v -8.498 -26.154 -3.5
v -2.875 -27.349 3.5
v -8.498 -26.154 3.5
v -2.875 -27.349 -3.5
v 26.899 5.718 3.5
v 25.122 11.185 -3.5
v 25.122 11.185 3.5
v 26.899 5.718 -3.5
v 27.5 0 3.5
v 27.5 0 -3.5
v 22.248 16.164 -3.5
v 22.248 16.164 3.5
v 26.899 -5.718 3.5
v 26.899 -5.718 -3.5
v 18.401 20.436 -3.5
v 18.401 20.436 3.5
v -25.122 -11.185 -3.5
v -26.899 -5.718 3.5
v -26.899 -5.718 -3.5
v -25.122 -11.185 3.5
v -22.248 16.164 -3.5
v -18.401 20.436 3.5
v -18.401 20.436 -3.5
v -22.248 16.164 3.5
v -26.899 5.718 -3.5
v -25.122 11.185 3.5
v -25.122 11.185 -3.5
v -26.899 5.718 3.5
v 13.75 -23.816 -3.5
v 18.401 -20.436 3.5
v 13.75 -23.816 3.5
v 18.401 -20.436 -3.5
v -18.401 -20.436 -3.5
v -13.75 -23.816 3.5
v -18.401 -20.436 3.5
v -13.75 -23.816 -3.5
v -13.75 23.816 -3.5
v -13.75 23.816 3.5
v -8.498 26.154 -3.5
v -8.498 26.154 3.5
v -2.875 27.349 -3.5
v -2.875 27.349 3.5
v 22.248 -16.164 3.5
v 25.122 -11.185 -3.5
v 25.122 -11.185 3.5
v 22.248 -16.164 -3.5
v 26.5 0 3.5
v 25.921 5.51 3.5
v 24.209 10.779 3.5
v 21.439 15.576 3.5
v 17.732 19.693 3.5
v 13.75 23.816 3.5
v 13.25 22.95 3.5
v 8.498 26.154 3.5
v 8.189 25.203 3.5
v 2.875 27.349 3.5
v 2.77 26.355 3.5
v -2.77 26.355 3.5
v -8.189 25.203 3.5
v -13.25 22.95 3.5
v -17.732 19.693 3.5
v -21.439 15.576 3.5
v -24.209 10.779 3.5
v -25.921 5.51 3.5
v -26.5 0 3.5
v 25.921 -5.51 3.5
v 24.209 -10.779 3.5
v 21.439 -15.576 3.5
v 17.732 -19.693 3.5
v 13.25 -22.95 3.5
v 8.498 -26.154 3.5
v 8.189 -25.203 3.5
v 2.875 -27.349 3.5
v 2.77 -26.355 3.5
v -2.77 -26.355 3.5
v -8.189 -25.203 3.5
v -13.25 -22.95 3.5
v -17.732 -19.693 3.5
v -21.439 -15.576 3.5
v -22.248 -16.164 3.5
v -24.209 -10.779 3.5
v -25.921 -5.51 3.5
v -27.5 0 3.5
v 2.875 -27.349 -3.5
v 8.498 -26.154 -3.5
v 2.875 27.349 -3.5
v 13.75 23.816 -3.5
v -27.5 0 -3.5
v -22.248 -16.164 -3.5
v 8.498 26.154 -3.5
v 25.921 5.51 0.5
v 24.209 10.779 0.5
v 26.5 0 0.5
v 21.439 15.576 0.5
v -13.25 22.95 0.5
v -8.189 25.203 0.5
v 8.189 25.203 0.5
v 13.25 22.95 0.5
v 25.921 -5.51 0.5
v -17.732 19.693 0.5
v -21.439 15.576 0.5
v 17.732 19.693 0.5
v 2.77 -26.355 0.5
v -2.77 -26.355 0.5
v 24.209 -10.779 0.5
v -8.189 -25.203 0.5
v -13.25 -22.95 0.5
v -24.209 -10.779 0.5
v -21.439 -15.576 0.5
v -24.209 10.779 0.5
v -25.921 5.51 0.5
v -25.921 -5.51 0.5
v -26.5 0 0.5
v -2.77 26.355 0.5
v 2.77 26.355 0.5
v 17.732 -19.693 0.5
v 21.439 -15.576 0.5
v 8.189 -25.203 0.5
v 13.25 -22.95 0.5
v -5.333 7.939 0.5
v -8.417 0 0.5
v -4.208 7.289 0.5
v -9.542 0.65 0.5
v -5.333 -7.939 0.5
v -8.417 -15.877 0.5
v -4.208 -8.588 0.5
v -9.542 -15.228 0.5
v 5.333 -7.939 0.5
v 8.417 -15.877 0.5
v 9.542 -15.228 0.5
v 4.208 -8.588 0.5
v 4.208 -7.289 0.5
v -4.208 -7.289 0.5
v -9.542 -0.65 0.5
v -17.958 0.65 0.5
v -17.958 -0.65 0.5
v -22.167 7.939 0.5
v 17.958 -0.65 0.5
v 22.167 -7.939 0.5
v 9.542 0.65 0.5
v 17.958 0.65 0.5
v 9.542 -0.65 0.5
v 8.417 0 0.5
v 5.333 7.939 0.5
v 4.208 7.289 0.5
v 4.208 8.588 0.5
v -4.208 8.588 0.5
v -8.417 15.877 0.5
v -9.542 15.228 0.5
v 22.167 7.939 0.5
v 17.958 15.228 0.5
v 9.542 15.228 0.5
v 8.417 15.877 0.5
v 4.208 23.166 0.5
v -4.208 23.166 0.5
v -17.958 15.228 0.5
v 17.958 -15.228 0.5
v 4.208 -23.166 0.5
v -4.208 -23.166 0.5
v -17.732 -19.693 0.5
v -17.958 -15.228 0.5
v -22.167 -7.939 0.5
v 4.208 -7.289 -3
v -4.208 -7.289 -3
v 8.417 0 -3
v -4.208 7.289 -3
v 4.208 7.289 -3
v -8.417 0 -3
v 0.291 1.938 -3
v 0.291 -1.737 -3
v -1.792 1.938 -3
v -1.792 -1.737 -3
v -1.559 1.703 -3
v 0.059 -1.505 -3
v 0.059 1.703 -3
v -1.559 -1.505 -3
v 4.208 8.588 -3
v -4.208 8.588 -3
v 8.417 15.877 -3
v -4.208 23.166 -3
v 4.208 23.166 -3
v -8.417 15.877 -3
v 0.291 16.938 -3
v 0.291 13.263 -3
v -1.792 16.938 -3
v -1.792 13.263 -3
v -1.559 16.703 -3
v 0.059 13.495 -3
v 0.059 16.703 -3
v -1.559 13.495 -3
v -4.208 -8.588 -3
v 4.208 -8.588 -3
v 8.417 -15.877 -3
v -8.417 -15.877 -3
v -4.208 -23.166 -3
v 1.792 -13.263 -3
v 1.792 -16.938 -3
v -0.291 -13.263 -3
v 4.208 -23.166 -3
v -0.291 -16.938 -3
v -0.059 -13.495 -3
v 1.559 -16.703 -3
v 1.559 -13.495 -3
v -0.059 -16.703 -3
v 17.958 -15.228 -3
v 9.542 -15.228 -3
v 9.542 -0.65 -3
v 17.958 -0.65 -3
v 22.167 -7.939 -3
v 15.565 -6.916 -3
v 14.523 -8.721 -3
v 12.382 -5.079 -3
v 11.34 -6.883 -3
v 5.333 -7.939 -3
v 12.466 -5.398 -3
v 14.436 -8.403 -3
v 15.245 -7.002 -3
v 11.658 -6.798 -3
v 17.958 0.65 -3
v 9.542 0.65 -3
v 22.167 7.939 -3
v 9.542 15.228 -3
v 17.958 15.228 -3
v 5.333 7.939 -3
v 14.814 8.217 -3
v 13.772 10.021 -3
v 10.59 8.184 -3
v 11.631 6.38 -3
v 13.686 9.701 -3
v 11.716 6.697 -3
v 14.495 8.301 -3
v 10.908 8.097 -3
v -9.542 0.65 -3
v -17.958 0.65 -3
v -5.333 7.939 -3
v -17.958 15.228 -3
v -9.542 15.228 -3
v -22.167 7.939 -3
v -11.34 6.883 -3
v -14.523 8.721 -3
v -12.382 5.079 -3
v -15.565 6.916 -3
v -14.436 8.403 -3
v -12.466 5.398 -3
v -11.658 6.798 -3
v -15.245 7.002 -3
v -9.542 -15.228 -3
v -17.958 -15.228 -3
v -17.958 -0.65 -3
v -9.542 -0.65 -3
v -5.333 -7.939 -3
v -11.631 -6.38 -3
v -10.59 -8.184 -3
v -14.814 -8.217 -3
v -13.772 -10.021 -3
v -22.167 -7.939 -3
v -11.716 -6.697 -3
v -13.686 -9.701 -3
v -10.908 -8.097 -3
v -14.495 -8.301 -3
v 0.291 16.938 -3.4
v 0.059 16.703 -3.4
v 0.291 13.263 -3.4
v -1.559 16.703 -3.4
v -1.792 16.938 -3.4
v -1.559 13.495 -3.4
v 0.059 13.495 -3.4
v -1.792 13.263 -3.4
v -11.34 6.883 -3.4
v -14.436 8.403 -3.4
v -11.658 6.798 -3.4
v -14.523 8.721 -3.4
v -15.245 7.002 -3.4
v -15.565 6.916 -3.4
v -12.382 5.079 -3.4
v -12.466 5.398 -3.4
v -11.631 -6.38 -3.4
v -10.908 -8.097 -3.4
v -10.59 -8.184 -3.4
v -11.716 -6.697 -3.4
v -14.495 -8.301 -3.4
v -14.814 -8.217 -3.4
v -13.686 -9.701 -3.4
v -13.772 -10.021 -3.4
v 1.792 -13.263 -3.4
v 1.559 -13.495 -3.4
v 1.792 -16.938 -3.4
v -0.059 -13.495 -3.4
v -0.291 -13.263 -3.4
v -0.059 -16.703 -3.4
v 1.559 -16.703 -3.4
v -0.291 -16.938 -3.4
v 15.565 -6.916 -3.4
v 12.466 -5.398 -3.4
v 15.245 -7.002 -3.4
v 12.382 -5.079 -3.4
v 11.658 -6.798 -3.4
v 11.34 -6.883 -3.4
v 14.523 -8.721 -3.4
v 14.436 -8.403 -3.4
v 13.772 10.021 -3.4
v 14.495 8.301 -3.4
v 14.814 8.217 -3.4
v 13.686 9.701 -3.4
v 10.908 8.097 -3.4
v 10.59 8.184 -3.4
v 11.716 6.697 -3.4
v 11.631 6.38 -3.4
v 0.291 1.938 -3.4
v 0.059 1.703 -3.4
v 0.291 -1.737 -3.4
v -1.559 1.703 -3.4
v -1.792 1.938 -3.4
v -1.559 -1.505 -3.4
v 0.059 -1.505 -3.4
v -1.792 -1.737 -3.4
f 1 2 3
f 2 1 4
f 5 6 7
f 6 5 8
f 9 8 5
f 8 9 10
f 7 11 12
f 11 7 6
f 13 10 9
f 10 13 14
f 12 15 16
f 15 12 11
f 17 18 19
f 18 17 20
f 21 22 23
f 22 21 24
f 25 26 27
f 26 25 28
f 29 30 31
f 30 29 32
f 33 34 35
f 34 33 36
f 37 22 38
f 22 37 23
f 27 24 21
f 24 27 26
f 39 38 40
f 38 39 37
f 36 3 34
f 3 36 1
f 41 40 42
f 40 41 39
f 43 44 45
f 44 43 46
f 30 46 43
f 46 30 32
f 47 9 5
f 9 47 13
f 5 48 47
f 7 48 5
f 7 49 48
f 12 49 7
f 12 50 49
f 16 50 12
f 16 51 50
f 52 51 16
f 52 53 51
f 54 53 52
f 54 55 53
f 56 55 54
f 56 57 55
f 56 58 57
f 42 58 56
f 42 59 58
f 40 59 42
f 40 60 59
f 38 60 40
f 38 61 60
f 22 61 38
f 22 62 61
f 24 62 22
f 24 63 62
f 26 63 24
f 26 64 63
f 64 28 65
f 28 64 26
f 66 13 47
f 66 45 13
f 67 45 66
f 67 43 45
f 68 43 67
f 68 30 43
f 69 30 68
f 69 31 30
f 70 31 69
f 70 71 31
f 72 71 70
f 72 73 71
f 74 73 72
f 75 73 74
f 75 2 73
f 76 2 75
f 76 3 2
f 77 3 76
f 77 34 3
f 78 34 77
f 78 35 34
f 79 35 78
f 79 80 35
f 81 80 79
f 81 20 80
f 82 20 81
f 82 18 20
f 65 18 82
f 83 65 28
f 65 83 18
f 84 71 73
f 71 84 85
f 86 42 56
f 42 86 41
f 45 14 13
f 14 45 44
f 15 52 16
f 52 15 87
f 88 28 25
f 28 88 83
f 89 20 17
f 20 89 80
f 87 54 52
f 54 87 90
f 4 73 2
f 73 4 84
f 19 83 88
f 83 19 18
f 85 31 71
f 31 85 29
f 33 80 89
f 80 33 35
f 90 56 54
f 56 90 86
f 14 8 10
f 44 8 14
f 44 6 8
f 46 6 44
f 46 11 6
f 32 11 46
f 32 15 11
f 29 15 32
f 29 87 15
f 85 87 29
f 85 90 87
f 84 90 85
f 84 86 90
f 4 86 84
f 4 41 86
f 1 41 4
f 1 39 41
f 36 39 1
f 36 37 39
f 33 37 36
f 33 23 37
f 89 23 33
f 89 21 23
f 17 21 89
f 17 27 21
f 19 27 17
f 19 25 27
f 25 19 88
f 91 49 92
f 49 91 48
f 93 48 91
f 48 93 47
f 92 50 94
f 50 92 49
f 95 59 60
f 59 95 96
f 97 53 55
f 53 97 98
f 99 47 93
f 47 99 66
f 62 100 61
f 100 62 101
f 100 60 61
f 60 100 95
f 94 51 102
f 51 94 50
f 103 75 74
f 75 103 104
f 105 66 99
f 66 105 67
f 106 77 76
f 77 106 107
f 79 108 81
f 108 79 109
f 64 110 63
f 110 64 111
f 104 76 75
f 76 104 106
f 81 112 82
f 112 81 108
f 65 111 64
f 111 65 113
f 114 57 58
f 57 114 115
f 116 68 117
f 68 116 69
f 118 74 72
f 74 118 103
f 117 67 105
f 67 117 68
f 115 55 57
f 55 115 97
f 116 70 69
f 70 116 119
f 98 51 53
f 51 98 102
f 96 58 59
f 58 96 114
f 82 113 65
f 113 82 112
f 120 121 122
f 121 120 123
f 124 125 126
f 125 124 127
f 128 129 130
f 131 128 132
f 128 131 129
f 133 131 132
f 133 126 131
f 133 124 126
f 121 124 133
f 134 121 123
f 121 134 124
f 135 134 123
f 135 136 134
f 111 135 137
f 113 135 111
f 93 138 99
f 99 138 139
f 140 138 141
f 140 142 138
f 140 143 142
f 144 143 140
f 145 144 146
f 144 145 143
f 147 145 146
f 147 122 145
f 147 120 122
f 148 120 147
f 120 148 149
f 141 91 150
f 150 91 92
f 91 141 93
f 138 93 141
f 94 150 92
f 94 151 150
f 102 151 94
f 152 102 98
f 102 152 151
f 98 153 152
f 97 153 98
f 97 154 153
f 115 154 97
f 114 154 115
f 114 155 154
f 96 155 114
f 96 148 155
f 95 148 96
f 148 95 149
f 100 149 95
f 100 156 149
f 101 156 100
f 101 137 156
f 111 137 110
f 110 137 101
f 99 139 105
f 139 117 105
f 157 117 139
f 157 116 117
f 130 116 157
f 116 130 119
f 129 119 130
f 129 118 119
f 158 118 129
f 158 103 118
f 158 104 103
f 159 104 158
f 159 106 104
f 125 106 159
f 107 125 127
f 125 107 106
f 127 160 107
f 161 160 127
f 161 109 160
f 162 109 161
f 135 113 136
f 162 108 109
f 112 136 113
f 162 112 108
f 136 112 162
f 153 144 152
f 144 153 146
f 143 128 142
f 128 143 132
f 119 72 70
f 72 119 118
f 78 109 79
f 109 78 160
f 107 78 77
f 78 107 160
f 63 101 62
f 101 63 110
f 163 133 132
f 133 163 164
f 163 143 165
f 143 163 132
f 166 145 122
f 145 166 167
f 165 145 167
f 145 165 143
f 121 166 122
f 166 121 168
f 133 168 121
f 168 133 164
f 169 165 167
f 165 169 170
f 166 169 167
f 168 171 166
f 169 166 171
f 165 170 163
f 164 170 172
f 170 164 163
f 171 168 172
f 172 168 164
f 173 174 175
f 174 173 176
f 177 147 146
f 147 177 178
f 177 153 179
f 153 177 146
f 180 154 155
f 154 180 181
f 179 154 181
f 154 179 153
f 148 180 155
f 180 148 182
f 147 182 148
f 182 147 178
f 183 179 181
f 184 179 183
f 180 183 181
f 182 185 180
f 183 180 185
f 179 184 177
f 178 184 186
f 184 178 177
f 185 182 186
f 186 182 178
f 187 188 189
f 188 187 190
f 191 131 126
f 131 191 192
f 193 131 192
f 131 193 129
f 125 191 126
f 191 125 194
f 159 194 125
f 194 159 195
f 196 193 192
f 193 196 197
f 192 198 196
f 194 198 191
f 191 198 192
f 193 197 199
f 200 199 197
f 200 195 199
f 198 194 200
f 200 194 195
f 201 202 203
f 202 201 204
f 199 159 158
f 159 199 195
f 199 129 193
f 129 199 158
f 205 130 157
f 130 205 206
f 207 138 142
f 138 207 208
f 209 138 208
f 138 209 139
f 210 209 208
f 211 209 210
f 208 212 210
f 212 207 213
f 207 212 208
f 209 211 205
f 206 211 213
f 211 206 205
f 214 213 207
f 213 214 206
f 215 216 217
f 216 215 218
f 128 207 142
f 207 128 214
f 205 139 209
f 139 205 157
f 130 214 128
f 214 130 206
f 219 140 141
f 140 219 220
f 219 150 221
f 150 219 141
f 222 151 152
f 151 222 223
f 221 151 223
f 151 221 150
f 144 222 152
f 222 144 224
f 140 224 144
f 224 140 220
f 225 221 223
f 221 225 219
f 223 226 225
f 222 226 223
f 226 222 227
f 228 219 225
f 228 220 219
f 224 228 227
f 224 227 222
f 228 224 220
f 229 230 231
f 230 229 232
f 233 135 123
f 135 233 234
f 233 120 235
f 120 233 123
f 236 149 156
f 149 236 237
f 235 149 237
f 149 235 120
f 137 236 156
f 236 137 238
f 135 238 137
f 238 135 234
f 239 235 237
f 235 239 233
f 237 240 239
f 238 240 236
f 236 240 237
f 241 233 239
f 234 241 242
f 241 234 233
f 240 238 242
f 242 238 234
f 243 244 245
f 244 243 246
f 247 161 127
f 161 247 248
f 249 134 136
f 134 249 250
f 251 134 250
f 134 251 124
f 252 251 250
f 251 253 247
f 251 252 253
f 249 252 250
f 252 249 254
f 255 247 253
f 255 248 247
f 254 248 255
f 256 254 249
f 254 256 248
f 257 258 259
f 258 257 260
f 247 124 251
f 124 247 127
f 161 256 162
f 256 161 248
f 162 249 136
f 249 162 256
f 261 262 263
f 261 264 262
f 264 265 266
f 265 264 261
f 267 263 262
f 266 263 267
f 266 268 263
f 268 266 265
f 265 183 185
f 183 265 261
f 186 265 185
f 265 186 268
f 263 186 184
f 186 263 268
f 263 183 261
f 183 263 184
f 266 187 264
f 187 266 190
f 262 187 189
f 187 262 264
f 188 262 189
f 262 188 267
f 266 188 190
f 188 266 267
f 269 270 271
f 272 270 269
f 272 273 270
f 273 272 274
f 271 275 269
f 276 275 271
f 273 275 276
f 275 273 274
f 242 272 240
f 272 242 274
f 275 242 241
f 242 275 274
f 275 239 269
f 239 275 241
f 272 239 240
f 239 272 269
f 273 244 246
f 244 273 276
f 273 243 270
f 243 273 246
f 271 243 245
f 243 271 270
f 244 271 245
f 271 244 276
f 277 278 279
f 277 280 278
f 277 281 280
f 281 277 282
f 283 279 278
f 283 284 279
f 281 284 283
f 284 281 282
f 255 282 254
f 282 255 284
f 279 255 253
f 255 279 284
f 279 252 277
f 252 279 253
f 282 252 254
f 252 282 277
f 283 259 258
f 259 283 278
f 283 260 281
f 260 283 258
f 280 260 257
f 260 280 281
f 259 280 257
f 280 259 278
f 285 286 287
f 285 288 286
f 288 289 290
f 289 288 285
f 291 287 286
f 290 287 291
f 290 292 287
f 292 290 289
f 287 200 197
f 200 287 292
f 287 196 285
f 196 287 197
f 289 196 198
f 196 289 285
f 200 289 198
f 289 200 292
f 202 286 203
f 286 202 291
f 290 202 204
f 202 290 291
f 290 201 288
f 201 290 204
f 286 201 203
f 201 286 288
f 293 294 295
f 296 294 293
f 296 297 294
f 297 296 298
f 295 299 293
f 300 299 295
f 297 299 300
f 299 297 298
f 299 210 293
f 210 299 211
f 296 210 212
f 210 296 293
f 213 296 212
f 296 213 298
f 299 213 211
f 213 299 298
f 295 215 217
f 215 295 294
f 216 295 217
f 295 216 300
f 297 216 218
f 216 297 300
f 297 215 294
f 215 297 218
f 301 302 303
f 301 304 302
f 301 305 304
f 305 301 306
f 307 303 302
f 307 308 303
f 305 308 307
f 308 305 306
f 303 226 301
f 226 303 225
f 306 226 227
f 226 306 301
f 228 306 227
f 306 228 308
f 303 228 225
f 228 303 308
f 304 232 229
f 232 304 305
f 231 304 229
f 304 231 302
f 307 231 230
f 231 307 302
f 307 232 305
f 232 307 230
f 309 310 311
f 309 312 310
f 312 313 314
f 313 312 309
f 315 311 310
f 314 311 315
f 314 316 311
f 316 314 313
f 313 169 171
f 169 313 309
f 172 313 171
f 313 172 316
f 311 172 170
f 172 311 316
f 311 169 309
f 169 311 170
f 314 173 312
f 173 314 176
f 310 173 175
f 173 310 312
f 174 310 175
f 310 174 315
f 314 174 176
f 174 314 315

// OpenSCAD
/* use <../NotoSansJP-DemiLight.otf> */


dr = 55/2;
dh = 7;
dw = 1;
df = 8;


hr = dr/3;
hw = .75;
hh = (df-2);
hd = hr * sqrt(3);



module labels() {
   translate([0, 0, -2.4]) {
      rotate([0, 0, 0]) {translate([-2,14, 0]) {number(1);}}
      rotate([0, 0, 60]) {translate([-2, 14, 0]) {number(2);}}
      rotate([0, 0, 120]) {translate([-2, 14, 0]) {number(3);}}
      rotate([0, 0, 180]) {translate([-2, 14, 0]) {number(4);}}
      rotate([0, 0, 240]) {translate([-2, 14, 0]) {number(5);}}
      rotate([0, 0, 300]) {translate([-2, 14, 0]) {number(6);}}
      rotate([0, 0, 0]) {translate([-2,-1, 0]) {number(7);}}
   }
}

/* lid(); */

difference() {
   lid();
   union() {
      hexhex();
      labels();
   }
}


module lid() {
   difference() {
      cylinder(r=dr, h=dh, center=true);
      translate([0, 0, df]) {cylinder(r=dr-dw, h=dh+df, center=true);}
   }
}


module hexhex() {
   hexagon(hr,hh);
   translate([0, hd, 0]) {hexagon(hr, hh);}
   translate([0, -hd, 0]) {hexagon(hr, hh);}
   translate([hr*1.5, -hd/2, 0]) {hexagon(hr, hh);}
   translate([hr*1.5, hd/2, 0]) {hexagon(hr, hh);}
   translate([-hr*1.5, hd/2, 0]) {hexagon(hr, hh);}
   translate([-hr*1.5, -hd/2, 0]) {hexagon(hr, hh);}

}
module hexagon(hex_radius,hex_height) {
   cylinder(r=hex_radius-hw, h=hex_height, $fn=6, center = true);
}


module number(n) {
   translate([0,0,0]) {
      scale([.3,.3,1]) {
         linear_extrude(height = 2, center = true, convexity = 10, twist = 0)
         if (n==1) { text("一", font = "NotoSansJP-DemiLight");}
         else if (n==2) { text("二", font = "NotoSansJP-DemiLight");}
         else if (n==3) { text("三", font = "NotoSansJP-DemiLight");}
         else if (n==4) { text("四", font = "NotoSansJP-DemiLight");}
         else if (n==5) { text("五", font = "NotoSansJP-DemiLight");}
         else if (n==6) { text("六", font = "NotoSansJP-DemiLight");}
         else if (n==7) { text("七", font = "NotoSansJP-DemiLight");}
         else if (n==8) { text("八", font = "NotoSansJP-DemiLight");}
      }
   }
}
